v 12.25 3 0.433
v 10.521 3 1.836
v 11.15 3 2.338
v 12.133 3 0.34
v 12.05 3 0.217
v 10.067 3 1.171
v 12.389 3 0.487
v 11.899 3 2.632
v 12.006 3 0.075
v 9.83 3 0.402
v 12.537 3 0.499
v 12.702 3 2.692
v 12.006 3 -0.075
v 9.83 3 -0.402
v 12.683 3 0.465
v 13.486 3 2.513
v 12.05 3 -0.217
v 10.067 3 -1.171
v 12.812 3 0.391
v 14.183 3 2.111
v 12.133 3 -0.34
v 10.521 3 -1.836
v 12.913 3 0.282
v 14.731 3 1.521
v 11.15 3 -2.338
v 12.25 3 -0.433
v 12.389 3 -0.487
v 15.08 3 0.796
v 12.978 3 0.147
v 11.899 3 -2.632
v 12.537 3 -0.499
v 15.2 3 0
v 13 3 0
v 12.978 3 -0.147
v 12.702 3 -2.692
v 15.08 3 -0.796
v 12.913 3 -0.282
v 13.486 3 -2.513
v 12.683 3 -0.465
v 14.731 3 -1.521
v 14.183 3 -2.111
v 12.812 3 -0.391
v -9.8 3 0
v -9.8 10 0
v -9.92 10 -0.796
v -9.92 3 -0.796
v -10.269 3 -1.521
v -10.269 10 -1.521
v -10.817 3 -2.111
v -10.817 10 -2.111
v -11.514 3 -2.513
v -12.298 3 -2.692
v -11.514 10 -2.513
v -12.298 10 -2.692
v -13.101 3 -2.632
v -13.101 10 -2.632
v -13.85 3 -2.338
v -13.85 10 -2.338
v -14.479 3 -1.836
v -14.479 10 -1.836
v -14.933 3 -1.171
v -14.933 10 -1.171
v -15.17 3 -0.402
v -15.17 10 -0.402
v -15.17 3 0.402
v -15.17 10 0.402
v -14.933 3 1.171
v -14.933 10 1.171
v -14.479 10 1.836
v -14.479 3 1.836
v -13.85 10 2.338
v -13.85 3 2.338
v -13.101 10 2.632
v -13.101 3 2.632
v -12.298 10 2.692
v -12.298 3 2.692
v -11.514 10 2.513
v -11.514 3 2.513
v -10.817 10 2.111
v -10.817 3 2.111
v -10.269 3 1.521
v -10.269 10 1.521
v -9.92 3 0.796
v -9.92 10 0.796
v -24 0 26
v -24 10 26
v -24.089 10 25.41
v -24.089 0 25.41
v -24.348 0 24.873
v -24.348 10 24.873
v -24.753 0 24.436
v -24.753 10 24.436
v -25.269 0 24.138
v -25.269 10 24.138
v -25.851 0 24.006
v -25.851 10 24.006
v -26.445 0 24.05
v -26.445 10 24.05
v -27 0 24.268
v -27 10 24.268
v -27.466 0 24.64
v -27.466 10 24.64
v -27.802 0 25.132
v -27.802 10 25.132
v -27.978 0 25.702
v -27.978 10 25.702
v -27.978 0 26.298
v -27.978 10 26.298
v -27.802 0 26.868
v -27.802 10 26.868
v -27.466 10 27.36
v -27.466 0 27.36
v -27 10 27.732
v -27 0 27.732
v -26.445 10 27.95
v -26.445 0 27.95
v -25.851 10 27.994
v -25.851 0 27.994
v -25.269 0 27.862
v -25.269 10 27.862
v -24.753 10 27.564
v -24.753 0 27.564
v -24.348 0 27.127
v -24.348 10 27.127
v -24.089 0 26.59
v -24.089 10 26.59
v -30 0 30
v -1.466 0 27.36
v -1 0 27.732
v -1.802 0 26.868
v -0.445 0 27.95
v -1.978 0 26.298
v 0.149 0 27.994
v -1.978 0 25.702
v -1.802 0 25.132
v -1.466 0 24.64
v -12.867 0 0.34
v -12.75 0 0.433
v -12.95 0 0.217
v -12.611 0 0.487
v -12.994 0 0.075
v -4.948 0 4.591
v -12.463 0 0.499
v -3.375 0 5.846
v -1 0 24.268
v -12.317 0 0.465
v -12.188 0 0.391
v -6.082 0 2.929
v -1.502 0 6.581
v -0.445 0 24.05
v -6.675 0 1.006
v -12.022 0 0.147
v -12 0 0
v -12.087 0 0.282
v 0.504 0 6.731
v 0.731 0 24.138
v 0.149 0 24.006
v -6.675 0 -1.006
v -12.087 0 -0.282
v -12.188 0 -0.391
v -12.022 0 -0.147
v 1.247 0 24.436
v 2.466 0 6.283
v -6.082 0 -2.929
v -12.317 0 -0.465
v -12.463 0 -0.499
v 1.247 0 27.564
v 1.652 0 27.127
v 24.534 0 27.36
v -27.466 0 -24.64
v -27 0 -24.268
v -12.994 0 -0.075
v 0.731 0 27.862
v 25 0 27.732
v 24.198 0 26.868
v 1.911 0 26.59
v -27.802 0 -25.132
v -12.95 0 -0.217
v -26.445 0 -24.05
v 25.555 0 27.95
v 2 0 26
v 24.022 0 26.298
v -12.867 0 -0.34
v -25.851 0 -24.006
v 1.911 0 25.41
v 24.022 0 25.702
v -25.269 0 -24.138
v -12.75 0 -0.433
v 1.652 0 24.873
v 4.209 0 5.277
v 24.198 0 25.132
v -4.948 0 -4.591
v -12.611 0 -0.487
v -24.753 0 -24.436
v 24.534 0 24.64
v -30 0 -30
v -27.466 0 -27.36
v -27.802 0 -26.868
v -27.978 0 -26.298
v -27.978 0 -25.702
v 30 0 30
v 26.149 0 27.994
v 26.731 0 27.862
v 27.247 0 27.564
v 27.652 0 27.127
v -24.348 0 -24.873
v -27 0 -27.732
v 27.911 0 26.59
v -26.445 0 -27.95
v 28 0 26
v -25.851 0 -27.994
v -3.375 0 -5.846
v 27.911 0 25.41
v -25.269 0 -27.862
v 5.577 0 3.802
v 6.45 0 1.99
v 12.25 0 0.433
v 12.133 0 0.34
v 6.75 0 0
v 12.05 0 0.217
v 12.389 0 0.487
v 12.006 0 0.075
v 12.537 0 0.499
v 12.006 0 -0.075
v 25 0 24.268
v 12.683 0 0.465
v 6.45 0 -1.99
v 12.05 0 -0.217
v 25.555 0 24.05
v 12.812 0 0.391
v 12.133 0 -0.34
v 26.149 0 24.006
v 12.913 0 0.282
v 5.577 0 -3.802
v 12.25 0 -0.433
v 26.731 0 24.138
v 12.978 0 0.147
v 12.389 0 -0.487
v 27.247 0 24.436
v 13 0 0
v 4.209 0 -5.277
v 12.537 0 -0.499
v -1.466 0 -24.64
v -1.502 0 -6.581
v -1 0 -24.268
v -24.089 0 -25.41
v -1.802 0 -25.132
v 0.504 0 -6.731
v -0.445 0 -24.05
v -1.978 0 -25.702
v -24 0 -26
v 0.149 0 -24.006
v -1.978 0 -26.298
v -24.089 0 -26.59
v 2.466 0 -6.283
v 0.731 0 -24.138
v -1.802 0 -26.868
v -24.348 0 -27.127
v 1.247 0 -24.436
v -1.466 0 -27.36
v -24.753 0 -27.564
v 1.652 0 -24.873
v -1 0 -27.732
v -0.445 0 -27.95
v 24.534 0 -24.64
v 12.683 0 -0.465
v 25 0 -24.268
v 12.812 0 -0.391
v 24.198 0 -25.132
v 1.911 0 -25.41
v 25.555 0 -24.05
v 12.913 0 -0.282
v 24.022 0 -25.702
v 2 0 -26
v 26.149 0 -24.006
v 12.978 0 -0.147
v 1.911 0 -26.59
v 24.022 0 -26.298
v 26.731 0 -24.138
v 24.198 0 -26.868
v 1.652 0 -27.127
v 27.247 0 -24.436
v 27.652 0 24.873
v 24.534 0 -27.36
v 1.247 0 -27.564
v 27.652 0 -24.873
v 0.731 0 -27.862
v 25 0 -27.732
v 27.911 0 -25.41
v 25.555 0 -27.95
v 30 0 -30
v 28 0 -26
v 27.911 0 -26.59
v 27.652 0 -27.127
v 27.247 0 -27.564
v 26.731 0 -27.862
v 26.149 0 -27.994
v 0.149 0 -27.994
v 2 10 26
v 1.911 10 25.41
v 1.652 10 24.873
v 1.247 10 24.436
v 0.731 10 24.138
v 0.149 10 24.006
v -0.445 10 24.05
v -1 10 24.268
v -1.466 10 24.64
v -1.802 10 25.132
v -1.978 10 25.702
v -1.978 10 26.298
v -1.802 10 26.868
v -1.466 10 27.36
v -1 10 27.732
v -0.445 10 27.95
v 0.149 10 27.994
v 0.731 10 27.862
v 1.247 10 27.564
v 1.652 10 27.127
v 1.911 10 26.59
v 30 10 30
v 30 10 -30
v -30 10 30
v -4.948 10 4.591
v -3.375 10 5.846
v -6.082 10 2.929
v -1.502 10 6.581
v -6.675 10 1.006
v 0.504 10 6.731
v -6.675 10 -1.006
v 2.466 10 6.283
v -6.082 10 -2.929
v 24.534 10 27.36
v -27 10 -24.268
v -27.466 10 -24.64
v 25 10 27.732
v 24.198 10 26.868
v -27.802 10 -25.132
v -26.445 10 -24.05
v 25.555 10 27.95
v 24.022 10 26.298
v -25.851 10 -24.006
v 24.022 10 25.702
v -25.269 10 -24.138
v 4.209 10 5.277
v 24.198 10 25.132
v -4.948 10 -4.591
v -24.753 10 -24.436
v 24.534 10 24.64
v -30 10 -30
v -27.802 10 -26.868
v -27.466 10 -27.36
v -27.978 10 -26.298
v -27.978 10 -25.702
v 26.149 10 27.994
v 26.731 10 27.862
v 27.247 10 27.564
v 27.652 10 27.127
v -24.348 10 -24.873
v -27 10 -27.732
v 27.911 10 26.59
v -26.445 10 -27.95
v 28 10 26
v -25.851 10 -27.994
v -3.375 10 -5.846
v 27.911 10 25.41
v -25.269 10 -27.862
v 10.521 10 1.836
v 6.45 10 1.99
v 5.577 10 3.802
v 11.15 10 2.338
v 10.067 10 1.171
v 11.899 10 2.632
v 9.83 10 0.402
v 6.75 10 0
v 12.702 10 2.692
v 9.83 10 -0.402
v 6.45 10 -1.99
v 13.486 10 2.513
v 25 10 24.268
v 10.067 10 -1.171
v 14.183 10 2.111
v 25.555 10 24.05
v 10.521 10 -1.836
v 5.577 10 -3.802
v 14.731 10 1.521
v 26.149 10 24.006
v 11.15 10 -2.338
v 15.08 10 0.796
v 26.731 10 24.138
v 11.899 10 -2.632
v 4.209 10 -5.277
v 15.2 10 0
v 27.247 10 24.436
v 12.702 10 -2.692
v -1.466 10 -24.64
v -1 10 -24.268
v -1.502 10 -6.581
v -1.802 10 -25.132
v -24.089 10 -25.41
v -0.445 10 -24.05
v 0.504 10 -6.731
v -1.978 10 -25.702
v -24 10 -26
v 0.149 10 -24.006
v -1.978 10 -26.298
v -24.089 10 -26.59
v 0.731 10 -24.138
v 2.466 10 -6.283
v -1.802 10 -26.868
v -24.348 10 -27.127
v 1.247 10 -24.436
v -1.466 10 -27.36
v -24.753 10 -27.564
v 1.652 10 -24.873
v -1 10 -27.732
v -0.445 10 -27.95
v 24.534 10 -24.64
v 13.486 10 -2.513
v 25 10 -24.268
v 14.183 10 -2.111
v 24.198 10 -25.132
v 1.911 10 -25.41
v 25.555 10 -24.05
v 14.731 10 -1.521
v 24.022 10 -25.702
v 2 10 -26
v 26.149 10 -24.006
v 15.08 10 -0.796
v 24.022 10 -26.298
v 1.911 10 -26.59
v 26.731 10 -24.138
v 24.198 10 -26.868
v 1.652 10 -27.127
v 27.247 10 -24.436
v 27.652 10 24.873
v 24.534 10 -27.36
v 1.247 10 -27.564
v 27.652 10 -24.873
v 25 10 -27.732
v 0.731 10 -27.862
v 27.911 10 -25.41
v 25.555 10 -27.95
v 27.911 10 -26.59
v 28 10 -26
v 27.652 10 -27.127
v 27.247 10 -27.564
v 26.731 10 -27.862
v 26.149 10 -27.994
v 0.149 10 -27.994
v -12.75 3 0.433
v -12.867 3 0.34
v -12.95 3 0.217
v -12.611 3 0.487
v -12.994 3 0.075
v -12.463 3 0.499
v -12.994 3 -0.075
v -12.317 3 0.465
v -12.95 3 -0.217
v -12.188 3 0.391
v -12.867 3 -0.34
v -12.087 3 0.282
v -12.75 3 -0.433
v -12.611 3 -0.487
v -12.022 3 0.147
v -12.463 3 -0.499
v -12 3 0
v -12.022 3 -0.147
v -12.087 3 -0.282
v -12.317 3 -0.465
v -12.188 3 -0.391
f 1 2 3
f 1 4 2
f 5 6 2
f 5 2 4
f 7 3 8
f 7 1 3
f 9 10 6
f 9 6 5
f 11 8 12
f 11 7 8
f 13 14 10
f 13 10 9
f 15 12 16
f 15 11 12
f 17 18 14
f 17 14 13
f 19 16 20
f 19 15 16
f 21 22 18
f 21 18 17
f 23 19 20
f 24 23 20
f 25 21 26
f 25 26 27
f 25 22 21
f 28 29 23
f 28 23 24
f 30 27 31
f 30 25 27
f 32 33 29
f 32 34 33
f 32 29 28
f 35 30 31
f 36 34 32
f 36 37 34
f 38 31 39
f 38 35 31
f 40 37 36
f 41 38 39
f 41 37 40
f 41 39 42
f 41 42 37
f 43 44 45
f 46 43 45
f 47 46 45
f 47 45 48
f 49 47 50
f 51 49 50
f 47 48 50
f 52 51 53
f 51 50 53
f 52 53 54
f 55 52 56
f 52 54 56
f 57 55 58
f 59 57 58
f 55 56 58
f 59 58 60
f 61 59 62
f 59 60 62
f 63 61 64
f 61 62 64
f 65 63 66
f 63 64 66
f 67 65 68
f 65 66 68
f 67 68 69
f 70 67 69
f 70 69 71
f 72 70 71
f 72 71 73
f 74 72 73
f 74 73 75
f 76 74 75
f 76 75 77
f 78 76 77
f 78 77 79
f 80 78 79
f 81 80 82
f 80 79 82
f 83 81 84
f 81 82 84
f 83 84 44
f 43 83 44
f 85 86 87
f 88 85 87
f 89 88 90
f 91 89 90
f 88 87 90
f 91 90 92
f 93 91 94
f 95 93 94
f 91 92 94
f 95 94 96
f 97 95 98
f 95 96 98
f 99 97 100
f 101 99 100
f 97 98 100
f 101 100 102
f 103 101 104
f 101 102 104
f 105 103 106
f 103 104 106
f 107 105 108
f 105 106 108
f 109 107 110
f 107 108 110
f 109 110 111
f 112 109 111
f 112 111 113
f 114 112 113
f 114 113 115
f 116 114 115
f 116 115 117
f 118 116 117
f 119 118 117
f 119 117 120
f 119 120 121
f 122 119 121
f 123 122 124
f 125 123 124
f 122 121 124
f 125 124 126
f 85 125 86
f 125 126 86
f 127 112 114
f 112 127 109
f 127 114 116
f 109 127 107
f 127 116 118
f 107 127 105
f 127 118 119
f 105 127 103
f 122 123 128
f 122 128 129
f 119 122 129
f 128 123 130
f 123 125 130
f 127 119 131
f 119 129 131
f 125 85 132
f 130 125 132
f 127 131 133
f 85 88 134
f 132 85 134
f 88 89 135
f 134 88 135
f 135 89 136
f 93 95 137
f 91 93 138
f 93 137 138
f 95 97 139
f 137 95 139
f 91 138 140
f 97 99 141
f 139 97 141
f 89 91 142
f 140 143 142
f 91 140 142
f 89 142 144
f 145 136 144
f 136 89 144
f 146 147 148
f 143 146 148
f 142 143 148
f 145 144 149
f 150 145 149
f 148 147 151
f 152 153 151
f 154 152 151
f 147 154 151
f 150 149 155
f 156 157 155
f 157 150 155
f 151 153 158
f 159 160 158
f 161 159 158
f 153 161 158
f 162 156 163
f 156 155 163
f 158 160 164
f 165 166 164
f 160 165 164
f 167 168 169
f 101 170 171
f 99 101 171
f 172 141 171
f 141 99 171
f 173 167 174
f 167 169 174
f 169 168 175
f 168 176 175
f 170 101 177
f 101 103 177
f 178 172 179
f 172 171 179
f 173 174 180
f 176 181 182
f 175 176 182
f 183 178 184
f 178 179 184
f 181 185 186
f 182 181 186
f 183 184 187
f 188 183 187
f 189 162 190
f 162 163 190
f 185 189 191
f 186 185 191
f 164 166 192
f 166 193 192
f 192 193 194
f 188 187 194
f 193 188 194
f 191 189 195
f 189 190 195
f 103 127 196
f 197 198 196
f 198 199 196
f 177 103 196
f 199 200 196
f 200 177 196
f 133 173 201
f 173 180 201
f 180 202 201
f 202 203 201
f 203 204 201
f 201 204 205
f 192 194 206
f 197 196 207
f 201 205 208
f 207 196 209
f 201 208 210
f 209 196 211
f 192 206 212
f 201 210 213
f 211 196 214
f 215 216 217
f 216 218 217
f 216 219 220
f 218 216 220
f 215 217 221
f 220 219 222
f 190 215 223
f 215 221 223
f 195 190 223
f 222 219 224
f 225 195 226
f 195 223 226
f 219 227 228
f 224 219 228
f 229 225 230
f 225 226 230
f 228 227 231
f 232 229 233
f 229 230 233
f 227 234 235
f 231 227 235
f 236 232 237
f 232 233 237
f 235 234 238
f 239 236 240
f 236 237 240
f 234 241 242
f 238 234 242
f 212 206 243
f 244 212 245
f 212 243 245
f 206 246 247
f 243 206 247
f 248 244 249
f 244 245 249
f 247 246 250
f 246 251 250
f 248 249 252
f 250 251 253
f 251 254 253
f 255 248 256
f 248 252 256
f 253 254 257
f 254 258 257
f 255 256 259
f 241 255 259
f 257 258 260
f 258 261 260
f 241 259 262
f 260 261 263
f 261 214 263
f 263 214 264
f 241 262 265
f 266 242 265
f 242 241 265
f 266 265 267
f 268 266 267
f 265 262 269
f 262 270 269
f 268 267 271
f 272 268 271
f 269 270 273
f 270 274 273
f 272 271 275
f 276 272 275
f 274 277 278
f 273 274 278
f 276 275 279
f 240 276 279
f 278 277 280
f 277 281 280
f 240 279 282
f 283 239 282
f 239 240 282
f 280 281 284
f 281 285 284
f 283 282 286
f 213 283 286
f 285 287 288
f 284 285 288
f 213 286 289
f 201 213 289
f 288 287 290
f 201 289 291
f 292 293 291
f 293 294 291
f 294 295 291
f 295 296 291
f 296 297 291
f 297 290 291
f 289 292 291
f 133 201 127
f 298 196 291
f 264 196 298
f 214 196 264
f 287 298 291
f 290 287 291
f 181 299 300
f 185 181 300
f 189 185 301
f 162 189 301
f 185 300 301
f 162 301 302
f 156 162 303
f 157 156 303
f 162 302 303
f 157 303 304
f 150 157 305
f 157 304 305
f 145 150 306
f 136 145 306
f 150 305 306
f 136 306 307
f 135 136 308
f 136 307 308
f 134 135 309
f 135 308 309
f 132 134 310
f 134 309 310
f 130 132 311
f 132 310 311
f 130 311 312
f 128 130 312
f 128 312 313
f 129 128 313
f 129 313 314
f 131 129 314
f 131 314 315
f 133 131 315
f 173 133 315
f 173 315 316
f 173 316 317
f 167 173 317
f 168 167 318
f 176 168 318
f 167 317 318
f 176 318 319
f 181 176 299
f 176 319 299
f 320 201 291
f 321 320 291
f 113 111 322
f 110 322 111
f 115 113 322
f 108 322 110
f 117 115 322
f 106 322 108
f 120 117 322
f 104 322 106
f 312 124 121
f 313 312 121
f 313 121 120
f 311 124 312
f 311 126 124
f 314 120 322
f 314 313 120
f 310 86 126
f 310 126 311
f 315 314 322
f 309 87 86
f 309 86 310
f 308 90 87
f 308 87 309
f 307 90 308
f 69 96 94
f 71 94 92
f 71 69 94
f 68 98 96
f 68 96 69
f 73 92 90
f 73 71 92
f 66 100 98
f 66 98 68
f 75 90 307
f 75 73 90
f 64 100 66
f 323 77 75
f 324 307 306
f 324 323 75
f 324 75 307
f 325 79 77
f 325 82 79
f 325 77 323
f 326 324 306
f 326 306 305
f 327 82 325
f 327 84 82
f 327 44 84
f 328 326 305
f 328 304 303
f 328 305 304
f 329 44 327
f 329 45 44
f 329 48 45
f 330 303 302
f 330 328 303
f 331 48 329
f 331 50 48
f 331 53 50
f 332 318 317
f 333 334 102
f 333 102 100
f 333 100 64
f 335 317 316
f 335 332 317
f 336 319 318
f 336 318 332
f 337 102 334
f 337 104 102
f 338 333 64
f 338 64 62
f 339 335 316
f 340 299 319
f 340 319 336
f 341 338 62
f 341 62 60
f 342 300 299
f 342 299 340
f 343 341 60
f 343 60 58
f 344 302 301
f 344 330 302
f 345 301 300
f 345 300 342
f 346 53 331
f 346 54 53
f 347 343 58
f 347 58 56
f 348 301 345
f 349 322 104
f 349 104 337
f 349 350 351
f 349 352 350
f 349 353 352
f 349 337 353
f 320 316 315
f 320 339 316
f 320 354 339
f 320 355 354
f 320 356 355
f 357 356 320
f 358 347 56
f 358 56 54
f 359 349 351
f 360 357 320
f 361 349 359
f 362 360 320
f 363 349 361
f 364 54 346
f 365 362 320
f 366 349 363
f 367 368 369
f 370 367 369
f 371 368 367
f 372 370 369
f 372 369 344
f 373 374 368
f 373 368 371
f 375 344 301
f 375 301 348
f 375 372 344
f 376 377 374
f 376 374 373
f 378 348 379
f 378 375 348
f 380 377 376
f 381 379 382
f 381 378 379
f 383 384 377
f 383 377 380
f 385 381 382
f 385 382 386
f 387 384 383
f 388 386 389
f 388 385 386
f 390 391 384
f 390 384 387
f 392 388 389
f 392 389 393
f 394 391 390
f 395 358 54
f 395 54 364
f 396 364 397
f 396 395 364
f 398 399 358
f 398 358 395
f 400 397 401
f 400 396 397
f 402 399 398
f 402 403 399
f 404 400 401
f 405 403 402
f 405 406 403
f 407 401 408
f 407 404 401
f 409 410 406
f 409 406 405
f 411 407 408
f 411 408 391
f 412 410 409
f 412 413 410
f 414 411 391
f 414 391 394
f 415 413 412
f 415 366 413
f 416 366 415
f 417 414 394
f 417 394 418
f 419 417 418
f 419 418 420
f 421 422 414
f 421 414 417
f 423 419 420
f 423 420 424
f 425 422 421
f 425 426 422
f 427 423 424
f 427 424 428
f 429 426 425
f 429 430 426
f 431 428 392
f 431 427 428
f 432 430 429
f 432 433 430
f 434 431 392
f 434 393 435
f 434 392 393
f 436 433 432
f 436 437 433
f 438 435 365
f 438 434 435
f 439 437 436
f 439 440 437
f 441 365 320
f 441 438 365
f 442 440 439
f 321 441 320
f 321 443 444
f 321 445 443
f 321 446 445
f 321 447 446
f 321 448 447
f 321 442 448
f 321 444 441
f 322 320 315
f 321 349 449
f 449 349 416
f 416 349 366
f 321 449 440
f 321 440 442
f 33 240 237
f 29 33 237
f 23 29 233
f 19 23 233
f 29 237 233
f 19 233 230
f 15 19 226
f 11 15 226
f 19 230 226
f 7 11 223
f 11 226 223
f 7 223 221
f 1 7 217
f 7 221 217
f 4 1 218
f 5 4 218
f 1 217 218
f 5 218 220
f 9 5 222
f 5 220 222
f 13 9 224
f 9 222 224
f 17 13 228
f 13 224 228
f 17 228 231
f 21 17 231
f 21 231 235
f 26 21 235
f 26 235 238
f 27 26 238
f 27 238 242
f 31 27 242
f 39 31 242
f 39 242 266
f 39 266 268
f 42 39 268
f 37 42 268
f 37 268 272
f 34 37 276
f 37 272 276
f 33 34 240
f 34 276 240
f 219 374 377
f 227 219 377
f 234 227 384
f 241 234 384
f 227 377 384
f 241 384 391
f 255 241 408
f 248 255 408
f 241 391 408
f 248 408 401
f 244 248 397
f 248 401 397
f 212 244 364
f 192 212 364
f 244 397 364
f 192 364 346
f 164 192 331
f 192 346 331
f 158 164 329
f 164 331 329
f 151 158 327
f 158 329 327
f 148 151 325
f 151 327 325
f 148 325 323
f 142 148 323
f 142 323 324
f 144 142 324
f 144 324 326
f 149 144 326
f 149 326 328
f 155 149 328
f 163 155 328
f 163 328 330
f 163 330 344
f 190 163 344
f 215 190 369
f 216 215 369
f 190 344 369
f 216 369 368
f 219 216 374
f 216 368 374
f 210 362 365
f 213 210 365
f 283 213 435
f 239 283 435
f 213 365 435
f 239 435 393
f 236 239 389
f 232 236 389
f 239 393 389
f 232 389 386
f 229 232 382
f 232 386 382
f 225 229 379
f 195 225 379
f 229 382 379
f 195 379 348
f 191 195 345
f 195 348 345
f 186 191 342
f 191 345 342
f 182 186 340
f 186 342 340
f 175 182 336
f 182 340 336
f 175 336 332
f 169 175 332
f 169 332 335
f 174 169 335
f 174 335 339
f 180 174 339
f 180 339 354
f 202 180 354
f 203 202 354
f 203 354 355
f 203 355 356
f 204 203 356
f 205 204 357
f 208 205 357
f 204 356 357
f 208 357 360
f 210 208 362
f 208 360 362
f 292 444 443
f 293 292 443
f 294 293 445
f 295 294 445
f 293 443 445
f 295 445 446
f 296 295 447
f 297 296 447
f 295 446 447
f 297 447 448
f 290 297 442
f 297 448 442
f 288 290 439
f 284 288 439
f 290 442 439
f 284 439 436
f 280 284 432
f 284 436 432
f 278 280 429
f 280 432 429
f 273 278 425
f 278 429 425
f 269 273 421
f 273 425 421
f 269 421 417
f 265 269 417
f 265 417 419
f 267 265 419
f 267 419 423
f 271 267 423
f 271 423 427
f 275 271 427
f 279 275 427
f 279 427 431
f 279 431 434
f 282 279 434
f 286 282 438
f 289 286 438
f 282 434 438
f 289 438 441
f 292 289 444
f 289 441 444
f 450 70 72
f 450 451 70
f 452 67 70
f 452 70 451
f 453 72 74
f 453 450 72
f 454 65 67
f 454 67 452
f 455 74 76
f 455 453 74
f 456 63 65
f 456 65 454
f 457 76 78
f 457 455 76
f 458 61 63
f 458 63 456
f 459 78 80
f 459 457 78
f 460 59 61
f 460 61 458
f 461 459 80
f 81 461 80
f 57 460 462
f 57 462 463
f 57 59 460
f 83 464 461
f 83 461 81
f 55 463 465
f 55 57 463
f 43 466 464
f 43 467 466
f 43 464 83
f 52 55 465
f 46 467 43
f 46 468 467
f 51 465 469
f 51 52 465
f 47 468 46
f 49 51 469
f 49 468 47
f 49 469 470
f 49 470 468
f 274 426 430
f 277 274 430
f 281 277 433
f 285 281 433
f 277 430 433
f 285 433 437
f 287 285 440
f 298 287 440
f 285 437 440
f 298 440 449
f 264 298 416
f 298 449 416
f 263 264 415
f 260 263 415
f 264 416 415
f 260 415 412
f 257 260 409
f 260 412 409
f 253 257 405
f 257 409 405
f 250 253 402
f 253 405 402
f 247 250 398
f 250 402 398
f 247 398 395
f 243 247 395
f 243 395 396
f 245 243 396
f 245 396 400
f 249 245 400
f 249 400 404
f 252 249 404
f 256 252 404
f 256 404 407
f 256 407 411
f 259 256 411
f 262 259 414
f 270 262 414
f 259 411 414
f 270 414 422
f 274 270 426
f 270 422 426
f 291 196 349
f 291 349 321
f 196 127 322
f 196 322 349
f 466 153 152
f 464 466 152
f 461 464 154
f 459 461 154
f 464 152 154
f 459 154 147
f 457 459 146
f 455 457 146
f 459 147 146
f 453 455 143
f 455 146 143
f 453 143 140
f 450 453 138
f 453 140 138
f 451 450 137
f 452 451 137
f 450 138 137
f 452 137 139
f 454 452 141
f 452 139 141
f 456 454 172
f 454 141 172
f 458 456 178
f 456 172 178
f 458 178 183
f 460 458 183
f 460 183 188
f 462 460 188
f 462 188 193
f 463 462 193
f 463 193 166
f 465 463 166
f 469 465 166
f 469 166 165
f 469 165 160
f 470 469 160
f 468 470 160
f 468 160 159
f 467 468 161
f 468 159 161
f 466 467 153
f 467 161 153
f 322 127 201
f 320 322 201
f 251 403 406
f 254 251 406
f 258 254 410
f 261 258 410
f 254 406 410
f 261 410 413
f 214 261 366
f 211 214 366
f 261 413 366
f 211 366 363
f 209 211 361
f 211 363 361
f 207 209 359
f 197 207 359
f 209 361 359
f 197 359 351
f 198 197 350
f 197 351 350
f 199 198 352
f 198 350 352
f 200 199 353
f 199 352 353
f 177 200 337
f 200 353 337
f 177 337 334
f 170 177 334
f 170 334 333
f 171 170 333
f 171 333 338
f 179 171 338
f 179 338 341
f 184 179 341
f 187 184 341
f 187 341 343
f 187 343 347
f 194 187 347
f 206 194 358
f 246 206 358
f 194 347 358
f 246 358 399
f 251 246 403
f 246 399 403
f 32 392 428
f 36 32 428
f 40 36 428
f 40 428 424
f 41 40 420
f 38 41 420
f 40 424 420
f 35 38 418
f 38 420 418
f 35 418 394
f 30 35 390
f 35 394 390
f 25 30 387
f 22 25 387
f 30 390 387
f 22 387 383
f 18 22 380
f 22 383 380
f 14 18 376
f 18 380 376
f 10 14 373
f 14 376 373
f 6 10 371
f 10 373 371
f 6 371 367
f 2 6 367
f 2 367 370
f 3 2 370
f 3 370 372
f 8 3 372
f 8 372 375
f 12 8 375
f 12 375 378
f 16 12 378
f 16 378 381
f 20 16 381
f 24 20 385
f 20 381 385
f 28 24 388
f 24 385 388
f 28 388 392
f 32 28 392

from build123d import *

# Parameters (mm, degrees)
SKETCH2_W           = 60
SKETCH2_H           = 60
BOSS_EXTRUDE1_DEPTH = 10
SKETCH3_R           = 2
CUT_EXTRUDE1_DEPTH  = 10
SKETCH5_R           = 2.7
CUT_EXTRUDE3_DEPTH  = 7
SKETCH6_R           = 0.5
CUT_EXTRUDE4_DEPTH  = 3
SKETCH7_R           = 6.75
CUT_EXTRUDE5_DEPTH  = 10


with BuildPart() as part:
    # Sketch2 → Boss-Extrude1 (new body)
    with BuildSketch(Plane(origin=(0, 0, 0), x_dir=(1, 0, 0), z_dir=(0, 1, 0))):
        Rectangle(SKETCH2_W, SKETCH2_H)
    extrude(amount=BOSS_EXTRUDE1_DEPTH)

    # Sketch3 → Cut-Extrude1 (cut)
    with BuildSketch(Plane(origin=(0, 10, 0), x_dir=(1, 0, 0), z_dir=(0, 1, 0))):
        with Locations((-26, 26)):
            Circle(SKETCH3_R)
        with Locations((-26, -26)):
            Circle(SKETCH3_R)
        with Locations((0, -26)):
            Circle(SKETCH3_R)
        with Locations((26, -26)):
            Circle(SKETCH3_R)
        with Locations((26, 26)):
            Circle(SKETCH3_R)
        with Locations((0, 26)):
            Circle(SKETCH3_R)
    extrude(amount=-CUT_EXTRUDE1_DEPTH, mode=Mode.SUBTRACT)

    # Sketch5 → Cut-Extrude3 (cut)
    with BuildSketch(Plane(origin=(0, 10, 0), x_dir=(1, 0, 0), z_dir=(0, 1, 0))):
        with Locations((12.5, 0)):
            Circle(SKETCH5_R)
        with Locations((-12.5, 0)):
            Circle(SKETCH5_R)
    extrude(amount=-CUT_EXTRUDE3_DEPTH, mode=Mode.SUBTRACT)

    # Sketch6 → Cut-Extrude4 (cut)
    with BuildSketch(Plane.XZ):
        with Locations((12.5, 0)):
            Circle(SKETCH6_R)
        with Locations((-12.5, 0)):
            Circle(SKETCH6_R)
    extrude(amount=-CUT_EXTRUDE4_DEPTH, mode=Mode.SUBTRACT)

    # Sketch7 → Cut-Extrude5 (cut)
    with BuildSketch(Plane(origin=(0, 10, 0), x_dir=(1, 0, 0), z_dir=(0, 1, 0))):
        Circle(SKETCH7_R)
    extrude(amount=-CUT_EXTRUDE5_DEPTH, mode=Mode.SUBTRACT)


solid = part.part
